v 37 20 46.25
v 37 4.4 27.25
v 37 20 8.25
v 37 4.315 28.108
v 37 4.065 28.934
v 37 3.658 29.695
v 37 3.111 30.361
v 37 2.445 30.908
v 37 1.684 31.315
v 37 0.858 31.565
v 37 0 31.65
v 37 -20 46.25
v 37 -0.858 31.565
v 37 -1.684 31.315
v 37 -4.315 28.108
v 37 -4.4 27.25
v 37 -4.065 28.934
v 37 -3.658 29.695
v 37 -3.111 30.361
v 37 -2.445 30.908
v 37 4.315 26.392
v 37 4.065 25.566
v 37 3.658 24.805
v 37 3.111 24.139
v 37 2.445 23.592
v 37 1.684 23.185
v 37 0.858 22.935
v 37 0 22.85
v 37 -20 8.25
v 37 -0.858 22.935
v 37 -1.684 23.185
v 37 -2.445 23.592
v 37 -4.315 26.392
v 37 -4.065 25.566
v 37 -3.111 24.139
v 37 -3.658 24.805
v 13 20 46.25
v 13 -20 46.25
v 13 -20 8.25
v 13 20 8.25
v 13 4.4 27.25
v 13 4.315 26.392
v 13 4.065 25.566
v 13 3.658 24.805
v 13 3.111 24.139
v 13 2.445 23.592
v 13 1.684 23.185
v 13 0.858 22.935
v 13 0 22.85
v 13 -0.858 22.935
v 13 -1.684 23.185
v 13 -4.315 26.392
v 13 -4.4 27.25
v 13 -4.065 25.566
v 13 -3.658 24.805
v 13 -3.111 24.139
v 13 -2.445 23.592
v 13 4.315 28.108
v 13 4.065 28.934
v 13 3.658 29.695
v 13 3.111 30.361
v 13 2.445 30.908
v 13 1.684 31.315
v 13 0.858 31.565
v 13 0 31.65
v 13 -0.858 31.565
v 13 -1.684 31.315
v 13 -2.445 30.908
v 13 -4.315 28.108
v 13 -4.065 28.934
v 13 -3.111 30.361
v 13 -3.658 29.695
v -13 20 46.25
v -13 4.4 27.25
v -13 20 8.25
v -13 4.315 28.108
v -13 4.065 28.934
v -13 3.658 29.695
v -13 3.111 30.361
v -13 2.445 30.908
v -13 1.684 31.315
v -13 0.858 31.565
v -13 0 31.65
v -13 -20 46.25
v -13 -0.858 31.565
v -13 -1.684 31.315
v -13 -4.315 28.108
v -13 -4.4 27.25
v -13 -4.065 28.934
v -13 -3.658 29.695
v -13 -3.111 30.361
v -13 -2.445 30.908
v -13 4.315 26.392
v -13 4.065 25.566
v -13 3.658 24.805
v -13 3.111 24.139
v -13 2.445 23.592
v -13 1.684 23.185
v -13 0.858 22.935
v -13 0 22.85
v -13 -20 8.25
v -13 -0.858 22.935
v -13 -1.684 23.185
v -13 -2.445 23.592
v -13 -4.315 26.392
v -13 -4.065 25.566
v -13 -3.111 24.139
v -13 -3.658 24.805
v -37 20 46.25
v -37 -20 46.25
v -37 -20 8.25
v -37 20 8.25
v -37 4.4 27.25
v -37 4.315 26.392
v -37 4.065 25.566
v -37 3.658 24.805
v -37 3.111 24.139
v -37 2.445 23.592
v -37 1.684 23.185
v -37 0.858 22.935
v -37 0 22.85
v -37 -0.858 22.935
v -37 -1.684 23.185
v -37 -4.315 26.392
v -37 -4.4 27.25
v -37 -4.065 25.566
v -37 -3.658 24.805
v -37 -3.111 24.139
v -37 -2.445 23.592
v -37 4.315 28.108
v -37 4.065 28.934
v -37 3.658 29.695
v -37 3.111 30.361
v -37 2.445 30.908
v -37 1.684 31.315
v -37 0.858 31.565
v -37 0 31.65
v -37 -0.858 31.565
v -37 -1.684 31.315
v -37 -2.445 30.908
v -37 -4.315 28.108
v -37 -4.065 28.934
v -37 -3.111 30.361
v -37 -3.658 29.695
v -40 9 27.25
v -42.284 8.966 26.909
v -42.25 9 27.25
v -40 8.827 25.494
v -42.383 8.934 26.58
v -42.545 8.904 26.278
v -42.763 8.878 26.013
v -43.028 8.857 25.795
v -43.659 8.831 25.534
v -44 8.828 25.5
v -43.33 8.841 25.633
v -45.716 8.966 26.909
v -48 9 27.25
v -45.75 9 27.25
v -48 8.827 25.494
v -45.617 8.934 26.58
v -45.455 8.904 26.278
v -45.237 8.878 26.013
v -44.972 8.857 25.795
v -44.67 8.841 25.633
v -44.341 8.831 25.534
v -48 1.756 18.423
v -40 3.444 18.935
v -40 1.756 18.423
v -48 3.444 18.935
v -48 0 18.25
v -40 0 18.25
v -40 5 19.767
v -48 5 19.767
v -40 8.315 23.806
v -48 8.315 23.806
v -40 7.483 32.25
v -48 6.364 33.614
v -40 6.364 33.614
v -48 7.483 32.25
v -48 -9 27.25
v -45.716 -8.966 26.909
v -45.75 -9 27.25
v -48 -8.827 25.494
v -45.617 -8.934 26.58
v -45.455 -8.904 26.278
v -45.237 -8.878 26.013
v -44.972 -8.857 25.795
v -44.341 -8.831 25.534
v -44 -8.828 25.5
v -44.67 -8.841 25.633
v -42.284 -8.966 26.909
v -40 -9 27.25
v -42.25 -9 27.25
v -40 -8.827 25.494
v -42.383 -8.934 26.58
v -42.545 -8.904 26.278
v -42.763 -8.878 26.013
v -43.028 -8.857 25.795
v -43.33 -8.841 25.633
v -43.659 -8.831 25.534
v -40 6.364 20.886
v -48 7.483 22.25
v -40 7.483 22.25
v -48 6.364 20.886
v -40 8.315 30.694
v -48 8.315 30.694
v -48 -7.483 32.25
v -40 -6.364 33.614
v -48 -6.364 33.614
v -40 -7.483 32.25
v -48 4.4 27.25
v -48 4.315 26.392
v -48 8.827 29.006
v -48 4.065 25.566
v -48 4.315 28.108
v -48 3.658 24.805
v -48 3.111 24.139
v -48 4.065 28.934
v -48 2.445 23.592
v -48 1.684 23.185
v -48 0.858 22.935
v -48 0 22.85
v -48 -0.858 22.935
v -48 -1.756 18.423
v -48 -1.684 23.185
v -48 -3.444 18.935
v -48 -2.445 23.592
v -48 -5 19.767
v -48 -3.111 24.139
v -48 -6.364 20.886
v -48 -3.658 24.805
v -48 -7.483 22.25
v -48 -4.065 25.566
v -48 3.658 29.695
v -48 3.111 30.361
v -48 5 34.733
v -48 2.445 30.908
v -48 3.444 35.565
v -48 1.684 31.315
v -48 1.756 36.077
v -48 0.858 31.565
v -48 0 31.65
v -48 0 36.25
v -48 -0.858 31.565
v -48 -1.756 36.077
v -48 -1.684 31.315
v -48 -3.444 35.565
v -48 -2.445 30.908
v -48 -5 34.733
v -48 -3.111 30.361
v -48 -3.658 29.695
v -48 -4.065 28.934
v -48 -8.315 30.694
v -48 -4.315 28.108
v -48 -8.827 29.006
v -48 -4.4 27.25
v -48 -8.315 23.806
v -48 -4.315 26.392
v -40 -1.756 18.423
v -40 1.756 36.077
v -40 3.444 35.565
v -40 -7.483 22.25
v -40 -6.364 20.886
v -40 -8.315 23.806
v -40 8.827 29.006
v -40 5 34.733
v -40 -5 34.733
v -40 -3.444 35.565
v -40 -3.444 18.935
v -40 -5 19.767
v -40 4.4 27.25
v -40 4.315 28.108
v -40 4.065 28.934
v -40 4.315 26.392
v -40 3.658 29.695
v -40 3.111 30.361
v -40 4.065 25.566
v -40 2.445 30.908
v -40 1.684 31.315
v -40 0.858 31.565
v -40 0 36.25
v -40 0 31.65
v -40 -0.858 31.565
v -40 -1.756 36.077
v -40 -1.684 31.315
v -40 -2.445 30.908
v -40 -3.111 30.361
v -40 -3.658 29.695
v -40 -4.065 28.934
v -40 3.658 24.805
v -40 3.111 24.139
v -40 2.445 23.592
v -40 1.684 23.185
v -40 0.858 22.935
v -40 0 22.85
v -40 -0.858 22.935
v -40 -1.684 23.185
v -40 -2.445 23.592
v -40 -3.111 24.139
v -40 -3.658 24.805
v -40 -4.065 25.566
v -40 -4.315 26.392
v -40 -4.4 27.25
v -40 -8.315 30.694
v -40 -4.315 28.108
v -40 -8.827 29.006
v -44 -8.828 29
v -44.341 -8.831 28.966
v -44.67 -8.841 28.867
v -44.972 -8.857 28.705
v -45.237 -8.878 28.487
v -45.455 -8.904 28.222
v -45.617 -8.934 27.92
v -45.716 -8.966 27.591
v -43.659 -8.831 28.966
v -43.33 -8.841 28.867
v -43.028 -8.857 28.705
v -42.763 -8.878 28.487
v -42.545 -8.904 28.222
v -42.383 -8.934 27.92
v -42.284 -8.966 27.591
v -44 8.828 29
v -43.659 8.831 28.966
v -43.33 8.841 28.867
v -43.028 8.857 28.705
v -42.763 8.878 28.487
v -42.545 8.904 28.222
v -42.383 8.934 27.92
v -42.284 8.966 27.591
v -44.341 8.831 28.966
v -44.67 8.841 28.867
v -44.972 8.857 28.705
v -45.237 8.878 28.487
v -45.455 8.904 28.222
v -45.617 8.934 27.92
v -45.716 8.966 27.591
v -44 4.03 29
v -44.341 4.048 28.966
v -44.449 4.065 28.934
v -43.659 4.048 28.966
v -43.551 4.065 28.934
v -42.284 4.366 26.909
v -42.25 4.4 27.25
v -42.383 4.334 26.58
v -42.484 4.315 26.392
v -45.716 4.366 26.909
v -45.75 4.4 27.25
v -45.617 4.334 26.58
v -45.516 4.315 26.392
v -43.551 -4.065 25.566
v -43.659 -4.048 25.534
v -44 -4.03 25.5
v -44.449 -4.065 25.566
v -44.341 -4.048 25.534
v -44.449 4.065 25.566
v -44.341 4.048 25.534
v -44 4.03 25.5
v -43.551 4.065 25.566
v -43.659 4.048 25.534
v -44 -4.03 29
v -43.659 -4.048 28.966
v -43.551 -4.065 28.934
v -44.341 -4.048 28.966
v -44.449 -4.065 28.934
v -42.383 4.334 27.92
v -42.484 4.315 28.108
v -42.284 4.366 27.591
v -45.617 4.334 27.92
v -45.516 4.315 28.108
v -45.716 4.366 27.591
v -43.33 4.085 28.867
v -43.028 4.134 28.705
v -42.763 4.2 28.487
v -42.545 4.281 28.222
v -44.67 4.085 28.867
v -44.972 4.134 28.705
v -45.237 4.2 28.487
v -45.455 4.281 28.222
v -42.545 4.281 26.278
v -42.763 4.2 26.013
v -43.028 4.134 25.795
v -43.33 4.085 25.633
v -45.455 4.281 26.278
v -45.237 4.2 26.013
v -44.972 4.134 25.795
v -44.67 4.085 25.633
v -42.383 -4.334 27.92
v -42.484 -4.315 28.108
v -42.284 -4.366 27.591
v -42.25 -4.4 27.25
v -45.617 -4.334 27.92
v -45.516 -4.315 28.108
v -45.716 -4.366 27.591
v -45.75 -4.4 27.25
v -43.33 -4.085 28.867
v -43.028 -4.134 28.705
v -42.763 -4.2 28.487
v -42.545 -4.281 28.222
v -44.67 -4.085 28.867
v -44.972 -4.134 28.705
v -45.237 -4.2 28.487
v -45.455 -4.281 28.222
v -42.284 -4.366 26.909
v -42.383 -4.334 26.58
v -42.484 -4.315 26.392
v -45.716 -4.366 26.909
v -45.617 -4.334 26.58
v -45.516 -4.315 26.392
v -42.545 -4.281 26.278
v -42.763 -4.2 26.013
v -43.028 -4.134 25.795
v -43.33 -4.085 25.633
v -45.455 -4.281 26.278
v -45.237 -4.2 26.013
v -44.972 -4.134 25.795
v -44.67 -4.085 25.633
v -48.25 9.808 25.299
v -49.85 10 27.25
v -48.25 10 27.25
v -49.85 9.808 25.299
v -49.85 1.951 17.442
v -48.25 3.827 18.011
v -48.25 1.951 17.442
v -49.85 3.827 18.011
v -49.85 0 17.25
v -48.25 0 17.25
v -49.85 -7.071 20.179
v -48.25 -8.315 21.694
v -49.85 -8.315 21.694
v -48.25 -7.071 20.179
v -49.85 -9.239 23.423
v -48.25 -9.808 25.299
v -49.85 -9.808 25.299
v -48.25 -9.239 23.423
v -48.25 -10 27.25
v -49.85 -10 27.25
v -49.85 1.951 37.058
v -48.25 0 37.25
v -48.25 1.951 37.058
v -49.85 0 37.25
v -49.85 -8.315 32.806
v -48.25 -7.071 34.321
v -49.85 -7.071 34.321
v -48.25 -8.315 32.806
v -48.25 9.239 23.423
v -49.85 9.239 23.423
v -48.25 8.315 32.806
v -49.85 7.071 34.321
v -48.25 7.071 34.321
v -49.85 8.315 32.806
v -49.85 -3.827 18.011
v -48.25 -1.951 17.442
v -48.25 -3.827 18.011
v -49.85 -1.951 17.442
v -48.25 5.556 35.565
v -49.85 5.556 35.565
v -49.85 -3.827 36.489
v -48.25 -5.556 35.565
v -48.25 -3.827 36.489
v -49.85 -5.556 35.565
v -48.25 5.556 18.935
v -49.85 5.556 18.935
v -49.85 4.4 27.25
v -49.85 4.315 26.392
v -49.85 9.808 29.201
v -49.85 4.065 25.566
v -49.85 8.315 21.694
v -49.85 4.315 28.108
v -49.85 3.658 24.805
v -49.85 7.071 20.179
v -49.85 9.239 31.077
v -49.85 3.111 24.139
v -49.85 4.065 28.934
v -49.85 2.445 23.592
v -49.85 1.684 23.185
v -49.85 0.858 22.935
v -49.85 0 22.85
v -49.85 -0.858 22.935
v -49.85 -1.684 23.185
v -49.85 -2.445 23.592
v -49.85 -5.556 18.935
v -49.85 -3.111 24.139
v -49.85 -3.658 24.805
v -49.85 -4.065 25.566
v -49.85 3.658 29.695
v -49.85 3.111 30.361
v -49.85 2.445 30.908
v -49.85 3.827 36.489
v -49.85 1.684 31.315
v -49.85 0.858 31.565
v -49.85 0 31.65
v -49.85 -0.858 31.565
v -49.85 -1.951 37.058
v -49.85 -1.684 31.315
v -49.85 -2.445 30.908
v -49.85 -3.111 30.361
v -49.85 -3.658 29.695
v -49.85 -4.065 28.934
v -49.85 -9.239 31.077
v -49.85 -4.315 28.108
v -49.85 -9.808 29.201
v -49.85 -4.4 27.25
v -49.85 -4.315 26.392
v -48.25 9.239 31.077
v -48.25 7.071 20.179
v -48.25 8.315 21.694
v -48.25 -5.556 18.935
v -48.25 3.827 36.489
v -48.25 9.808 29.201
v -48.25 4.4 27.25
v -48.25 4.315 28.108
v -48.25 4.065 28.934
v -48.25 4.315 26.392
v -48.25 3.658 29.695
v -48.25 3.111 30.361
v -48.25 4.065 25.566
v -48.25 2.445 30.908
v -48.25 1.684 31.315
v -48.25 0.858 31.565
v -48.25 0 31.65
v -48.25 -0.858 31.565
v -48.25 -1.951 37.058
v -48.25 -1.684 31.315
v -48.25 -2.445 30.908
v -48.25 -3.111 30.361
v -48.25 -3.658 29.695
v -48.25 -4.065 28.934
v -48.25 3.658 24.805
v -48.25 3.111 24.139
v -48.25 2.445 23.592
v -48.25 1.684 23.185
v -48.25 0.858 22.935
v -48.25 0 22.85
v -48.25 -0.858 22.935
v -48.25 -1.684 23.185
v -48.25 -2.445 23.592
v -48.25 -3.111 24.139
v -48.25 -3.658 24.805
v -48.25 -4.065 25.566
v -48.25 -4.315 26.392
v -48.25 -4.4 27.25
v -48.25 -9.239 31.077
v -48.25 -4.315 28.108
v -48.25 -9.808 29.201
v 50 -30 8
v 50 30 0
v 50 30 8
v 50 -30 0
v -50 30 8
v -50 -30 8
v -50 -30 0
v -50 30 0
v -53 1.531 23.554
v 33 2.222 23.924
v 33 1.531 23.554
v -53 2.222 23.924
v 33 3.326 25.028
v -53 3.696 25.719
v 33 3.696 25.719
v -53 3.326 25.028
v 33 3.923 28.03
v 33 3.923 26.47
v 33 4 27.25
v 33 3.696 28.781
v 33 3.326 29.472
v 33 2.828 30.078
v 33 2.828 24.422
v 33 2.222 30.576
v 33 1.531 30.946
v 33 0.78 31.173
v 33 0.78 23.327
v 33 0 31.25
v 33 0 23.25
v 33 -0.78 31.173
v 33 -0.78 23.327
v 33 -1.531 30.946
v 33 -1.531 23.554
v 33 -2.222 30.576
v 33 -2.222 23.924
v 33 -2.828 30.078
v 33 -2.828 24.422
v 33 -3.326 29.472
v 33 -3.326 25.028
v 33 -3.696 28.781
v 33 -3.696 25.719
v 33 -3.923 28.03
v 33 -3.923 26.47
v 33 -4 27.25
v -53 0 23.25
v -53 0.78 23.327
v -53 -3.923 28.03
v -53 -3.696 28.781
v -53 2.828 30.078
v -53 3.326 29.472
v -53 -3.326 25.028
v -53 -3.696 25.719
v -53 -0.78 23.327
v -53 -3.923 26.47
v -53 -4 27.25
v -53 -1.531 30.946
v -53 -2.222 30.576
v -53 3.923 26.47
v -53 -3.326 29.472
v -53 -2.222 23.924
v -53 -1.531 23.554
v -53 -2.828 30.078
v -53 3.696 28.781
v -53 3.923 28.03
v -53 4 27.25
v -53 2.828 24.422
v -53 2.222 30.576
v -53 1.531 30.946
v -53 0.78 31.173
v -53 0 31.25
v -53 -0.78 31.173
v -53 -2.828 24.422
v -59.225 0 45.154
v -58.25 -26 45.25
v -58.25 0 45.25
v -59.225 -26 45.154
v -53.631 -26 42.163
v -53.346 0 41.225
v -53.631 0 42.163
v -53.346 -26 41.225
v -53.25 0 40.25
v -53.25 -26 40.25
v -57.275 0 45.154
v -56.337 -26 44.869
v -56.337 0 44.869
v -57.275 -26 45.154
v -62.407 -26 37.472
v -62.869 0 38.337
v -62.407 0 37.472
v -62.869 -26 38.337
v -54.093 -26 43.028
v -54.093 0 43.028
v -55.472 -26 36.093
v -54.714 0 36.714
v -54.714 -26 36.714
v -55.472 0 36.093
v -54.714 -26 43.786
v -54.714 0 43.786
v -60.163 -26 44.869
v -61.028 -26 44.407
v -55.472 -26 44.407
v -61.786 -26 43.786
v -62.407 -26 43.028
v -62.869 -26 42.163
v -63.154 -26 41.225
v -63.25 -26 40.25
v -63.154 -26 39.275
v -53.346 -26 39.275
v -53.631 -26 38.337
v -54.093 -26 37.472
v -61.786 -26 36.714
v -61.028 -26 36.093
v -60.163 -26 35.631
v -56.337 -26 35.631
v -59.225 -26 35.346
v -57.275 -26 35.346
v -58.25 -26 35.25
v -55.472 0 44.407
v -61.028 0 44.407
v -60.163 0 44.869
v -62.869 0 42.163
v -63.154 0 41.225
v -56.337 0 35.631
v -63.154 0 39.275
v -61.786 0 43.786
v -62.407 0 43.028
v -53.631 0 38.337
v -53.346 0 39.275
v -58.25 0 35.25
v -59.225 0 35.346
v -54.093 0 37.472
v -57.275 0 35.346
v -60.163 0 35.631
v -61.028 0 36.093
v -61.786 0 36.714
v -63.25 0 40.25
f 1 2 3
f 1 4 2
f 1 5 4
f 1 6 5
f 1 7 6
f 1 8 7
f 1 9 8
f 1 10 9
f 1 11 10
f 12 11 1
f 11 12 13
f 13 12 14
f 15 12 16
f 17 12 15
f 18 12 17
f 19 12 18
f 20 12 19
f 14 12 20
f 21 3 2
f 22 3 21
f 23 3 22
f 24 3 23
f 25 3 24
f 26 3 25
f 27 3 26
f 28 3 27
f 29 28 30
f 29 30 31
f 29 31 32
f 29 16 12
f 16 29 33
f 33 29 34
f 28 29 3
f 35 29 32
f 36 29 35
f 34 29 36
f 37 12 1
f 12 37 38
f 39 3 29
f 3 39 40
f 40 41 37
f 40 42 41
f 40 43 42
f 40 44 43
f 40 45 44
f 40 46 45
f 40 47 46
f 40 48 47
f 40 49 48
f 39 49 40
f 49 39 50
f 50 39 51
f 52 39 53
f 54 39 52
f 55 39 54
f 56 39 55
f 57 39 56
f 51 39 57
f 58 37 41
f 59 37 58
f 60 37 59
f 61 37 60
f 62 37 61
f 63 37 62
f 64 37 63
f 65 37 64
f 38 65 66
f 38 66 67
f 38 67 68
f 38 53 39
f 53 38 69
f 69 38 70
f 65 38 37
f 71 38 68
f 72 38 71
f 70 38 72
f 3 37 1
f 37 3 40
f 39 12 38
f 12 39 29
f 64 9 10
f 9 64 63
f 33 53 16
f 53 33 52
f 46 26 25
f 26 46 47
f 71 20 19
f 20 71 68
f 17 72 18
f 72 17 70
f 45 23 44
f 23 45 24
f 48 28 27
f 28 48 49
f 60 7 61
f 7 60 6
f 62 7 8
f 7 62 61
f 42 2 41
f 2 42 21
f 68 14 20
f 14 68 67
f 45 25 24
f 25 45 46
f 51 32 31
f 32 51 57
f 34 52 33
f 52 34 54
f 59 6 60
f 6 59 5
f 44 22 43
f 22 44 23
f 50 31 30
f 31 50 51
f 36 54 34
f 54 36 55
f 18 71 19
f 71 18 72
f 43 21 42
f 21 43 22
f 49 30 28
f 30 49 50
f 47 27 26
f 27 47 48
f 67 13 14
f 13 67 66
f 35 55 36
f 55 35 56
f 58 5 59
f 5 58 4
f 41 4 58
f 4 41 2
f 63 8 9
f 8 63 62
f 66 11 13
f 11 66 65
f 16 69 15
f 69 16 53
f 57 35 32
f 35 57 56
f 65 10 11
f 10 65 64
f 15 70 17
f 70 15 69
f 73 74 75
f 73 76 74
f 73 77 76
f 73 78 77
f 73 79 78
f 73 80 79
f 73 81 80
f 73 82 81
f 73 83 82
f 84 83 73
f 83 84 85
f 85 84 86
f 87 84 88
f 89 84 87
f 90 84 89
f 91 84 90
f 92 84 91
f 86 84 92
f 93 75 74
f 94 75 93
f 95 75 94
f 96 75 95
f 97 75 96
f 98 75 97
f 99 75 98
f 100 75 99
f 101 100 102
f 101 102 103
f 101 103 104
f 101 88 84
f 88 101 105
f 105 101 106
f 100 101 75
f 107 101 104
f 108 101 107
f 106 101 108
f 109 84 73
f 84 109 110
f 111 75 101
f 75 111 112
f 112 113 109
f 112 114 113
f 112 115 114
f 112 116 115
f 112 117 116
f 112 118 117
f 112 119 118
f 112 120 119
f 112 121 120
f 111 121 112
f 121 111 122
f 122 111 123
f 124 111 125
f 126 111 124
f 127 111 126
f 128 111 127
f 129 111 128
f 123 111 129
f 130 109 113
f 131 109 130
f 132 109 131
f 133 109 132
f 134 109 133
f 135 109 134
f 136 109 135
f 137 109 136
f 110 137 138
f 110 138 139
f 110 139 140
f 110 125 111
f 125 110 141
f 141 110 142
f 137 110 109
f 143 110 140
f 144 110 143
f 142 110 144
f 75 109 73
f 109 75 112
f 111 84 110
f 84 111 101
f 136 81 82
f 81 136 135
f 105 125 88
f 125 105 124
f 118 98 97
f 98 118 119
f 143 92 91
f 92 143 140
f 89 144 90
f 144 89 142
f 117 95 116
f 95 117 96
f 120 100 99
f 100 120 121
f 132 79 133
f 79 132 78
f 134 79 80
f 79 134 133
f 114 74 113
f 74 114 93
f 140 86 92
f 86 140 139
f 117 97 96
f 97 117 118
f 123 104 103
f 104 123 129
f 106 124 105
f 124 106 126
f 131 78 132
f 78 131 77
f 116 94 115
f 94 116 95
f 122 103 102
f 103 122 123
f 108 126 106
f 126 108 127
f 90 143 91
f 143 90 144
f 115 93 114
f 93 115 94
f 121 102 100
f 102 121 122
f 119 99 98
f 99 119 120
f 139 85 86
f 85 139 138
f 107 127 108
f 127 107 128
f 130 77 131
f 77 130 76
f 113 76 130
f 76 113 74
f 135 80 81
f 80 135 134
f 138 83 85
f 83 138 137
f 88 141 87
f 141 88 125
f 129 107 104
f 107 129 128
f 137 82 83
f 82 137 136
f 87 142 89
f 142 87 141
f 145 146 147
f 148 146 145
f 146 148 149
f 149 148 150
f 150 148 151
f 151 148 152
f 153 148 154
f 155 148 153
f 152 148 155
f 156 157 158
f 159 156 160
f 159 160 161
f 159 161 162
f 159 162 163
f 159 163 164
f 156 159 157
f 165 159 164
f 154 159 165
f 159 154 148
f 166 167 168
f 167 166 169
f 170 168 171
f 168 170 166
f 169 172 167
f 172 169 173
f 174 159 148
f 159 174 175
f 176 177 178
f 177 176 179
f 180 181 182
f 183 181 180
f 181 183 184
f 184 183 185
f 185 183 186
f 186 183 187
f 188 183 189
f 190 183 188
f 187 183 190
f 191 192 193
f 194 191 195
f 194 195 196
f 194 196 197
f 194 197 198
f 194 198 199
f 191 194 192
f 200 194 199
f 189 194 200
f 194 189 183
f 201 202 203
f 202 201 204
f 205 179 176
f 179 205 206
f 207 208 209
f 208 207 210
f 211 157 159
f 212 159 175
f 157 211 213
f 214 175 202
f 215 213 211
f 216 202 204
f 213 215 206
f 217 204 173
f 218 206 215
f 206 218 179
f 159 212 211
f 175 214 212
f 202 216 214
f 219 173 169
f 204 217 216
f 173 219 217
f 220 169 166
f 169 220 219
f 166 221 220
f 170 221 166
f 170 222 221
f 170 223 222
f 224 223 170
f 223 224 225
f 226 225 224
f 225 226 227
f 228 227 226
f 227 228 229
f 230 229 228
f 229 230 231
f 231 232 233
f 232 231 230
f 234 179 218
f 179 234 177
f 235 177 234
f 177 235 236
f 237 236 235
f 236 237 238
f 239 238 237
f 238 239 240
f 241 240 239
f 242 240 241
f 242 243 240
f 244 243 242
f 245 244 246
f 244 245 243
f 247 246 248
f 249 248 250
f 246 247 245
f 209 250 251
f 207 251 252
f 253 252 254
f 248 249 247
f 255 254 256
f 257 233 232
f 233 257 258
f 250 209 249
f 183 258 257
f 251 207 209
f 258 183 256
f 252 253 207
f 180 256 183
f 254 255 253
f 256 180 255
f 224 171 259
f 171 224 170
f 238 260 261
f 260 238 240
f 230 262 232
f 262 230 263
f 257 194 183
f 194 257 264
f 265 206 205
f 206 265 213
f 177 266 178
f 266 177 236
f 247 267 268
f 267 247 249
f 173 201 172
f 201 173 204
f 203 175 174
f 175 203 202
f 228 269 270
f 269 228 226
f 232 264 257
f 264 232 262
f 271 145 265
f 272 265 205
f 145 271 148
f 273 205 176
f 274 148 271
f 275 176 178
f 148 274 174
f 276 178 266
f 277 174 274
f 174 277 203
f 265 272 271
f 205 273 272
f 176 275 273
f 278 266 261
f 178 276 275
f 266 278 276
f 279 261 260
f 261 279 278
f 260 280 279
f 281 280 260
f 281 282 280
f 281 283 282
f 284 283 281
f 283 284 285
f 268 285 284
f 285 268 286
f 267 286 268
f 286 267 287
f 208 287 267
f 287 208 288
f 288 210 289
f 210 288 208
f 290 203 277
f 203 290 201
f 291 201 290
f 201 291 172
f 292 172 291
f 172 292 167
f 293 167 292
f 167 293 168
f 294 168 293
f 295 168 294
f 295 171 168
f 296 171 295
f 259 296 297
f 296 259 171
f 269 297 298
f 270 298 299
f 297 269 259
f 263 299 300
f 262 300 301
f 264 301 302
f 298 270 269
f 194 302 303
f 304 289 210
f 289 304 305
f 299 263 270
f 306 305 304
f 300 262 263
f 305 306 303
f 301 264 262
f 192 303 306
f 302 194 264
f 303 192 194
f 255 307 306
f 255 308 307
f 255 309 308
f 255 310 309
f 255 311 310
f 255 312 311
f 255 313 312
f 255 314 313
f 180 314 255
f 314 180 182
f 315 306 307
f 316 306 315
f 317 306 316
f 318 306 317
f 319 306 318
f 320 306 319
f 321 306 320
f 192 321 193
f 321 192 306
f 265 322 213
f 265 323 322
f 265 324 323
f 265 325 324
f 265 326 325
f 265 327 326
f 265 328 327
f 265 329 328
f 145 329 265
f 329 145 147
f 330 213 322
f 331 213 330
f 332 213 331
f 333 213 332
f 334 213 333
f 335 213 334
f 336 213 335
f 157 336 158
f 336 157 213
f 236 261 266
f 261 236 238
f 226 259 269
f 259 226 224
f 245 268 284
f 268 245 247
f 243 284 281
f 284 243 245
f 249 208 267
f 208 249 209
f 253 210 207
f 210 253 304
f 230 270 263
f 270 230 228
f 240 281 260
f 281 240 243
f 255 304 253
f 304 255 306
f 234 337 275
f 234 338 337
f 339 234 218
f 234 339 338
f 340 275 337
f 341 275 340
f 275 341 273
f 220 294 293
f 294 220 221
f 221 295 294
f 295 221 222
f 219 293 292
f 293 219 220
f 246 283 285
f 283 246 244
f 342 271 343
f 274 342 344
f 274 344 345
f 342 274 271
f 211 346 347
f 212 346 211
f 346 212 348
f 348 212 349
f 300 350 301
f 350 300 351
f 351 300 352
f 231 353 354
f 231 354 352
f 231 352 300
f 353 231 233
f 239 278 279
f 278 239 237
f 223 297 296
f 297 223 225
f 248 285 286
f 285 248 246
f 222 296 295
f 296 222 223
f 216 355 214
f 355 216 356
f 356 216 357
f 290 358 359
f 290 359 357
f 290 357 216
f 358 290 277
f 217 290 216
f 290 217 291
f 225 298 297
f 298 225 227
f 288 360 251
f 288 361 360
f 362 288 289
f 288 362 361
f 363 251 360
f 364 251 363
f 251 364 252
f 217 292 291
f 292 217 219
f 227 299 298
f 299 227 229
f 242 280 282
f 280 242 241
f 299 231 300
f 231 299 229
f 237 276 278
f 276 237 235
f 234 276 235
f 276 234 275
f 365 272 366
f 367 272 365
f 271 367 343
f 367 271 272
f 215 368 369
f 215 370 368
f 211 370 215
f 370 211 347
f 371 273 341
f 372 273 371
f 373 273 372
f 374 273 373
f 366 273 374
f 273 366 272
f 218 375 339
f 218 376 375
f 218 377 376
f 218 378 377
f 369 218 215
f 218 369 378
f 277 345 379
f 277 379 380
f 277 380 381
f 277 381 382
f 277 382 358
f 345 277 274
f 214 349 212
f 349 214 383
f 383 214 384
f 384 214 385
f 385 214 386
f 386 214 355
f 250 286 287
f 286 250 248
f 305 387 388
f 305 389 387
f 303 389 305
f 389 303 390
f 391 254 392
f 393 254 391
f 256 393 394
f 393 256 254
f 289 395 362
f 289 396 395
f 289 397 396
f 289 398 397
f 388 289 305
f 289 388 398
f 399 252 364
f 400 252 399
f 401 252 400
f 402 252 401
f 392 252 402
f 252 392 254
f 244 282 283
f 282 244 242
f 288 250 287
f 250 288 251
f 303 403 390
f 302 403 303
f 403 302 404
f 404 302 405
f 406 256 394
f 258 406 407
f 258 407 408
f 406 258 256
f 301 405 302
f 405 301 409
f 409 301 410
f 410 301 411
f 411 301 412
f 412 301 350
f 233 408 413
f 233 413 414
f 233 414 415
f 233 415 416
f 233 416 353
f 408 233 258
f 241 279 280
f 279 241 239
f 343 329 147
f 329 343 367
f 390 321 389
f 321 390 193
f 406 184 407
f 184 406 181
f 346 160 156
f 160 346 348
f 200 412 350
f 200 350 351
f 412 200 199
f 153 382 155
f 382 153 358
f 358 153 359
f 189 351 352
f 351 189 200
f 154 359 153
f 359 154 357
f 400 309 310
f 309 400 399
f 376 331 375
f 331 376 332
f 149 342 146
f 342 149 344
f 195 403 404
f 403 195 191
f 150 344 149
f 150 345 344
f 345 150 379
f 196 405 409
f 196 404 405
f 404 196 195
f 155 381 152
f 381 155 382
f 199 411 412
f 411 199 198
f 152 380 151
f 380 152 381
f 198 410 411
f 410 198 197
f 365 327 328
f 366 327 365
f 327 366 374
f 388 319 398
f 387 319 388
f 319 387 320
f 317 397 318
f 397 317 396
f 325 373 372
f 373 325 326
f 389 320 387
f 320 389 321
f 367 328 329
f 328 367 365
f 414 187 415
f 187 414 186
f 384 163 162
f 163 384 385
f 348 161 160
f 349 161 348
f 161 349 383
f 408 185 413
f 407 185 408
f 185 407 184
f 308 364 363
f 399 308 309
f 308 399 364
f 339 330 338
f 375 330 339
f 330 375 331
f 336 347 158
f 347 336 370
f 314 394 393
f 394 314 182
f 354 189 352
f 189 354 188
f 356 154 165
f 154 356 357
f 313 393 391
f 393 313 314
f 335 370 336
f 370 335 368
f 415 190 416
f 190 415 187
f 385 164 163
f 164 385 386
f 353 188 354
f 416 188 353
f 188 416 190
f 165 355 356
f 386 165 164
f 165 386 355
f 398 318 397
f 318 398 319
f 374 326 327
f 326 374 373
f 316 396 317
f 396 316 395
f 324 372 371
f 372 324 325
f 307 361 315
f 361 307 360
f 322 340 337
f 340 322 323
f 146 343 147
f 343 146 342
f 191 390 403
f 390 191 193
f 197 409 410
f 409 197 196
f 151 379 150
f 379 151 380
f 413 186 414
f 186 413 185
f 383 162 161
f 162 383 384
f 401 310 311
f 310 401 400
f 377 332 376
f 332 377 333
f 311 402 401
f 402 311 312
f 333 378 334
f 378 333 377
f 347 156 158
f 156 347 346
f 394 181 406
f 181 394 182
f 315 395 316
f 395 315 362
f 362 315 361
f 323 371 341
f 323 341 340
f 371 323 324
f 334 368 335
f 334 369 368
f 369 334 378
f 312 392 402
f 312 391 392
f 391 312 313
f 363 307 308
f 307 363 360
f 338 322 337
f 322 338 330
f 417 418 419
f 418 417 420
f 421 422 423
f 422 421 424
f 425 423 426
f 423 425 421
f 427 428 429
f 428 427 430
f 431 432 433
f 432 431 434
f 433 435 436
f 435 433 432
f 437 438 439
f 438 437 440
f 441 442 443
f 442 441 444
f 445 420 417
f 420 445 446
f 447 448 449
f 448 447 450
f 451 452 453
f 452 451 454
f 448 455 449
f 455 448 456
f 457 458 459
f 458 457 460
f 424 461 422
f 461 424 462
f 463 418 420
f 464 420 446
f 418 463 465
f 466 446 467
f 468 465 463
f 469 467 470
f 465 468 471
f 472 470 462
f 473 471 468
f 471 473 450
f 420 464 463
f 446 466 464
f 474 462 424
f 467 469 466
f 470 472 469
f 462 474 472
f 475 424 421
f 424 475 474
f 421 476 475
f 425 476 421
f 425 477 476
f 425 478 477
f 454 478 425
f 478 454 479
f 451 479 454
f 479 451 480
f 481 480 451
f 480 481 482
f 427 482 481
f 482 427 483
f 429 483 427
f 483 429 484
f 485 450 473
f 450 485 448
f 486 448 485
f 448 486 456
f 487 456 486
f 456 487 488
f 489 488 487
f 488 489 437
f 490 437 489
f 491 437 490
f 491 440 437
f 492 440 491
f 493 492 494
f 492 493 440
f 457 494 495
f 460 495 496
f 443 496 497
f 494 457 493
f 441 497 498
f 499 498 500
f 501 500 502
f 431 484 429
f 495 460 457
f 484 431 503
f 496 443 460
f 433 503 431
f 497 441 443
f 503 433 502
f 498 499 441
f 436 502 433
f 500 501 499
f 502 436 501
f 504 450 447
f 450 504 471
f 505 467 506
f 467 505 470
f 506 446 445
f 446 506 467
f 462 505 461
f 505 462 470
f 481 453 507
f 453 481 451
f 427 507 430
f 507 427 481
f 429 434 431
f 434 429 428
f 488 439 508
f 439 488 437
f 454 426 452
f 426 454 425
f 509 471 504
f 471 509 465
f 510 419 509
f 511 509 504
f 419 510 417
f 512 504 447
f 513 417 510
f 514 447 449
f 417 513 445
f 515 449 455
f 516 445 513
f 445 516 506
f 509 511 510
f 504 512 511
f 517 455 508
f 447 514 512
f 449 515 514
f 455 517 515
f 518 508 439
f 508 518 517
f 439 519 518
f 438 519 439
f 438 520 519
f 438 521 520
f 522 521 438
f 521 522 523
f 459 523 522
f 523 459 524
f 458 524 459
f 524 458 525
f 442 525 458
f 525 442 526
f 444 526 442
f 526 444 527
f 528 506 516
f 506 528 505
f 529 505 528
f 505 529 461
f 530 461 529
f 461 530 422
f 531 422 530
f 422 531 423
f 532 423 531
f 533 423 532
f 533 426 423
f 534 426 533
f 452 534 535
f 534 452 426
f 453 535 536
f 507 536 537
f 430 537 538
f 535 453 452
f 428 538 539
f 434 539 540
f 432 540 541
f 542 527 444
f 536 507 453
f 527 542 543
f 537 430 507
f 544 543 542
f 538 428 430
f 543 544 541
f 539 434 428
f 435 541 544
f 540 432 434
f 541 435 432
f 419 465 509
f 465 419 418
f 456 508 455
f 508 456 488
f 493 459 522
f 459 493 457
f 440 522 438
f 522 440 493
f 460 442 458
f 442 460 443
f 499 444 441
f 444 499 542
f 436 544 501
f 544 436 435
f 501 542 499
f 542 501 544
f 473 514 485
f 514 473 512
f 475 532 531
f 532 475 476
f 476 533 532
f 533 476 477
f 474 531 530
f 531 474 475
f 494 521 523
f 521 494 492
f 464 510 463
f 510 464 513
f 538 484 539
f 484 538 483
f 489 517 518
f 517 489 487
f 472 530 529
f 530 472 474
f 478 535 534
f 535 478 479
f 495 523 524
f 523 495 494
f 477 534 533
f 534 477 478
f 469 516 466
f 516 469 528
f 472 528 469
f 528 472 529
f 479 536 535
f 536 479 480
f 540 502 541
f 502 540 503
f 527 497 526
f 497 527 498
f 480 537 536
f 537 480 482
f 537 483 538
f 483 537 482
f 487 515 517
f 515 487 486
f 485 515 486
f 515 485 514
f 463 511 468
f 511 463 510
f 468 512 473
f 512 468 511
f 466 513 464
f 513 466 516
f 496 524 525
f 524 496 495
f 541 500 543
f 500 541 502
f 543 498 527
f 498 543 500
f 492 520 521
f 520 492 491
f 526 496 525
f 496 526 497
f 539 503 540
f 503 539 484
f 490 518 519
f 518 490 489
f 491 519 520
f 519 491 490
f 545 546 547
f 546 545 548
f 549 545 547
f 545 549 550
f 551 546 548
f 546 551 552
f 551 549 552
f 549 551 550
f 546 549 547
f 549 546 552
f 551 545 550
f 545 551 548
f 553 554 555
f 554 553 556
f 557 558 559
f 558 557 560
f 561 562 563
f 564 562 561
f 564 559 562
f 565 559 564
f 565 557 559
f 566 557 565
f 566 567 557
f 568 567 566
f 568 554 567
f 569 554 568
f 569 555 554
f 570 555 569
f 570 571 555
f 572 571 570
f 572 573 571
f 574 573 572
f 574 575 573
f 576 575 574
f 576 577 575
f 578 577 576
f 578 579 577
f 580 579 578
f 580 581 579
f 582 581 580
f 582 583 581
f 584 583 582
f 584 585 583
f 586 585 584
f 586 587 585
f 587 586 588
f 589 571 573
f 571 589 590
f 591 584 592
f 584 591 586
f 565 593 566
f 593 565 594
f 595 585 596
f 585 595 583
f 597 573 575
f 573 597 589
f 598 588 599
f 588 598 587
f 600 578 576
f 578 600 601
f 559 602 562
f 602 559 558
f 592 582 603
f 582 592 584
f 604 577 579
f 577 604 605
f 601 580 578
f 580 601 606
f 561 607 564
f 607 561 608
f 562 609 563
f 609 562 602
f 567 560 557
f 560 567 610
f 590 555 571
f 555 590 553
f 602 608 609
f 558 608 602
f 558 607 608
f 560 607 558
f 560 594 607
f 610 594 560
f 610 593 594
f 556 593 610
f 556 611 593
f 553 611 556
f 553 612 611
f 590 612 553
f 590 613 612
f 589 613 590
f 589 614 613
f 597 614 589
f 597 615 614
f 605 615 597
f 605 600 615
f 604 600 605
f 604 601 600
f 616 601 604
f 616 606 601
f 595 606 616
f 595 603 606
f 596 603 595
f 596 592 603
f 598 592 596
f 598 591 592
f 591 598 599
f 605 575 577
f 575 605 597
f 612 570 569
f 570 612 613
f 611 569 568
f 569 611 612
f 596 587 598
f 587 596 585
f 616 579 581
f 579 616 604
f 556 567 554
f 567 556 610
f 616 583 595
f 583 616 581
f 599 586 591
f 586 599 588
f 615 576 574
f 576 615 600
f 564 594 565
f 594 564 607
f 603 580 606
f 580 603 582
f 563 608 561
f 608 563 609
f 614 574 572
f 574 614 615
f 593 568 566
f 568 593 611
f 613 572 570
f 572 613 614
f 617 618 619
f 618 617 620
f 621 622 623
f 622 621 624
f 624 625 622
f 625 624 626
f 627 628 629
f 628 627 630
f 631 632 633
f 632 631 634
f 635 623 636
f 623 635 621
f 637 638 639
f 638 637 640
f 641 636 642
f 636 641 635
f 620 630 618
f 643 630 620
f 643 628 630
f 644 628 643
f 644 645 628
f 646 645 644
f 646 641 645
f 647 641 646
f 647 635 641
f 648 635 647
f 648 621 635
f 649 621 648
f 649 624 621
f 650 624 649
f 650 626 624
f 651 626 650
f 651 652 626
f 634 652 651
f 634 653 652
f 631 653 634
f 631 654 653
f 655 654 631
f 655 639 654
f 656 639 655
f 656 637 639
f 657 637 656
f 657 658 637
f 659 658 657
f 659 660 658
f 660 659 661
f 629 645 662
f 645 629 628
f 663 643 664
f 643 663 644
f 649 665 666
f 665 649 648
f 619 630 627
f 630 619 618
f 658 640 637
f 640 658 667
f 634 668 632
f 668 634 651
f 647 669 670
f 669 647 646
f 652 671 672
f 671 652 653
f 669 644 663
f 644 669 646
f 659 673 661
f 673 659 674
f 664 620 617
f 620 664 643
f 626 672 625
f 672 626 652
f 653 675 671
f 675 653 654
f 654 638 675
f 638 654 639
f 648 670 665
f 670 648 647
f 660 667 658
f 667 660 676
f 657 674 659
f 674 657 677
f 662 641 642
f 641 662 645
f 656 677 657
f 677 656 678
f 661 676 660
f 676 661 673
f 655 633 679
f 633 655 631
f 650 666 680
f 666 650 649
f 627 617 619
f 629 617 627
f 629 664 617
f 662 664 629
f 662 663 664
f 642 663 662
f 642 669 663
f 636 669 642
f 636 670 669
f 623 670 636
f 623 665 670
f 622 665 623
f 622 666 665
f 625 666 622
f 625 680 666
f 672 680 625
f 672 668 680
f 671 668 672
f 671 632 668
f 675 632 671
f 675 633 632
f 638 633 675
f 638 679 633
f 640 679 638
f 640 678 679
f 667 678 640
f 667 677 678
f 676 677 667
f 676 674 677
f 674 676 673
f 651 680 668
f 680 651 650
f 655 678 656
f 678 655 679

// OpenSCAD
$fn = 32;

// ------------------------------------------------------------------------
// Machine vise: screw d8, jaws 24 x 38 mm
// Every part is its own module, assembly() places every instance.
// ------------------------------------------------------------------------

// --- part 1 ---
module vise_bed() {
  difference() {
    translate([-50, -30, 0]) cube([100, 60, 8]);
  }
}

// --- part 2 ---
module vise_jaw() {
  difference() {
    translate([-12, -20, 0]) cube([24, 40, 38]);
    translate([0, 0, 19]) rotate([0, 90, 0]) cylinder(h = 26, d = 8.8, center = true);
  }
}

// --- part 3 ---
module vise_screw() {
  translate([0, 0, -43]) cylinder(h = 86, d = 8);
}

// --- part 4 ---
module screw_collar() {
  difference() {
    cylinder(h = 8, d = 18);
    translate([0, 0, -1]) cylinder(h = 10, d = 8.8);
    translate([0, 0, 4]) rotate([90, 0, 0]) cylinder(h = 20, d = 3.5, center = true);
  }
}

// --- part 5 ---
module screw_washer() {
  difference() {
      translate([0, 0, 0]) cylinder(h = 1.6, d = 20);
      translate([0, 0, -1]) cylinder(h = 3.6, d = 8.8);
    }
}

// --- part 6 ---
module vise_handle() {
  cylinder(h = 26, d = 10);
}

// --- assembly ---
module assembly() {
  color([0.80, 0.24, 0.20]) translate([0, 0, 0]) rotate([0, 0, 0]) vise_bed();
  color([0.20, 0.45, 0.75]) translate([25, 0, 8.25]) rotate([0, 0, 0]) vise_jaw();
  color([0.25, 0.62, 0.32]) translate([-25, 0, 8.25]) rotate([0, 0, 0]) vise_jaw();
  color([0.92, 0.70, 0.18]) translate([-10, 0, 27.25]) rotate([0, 90, 0]) vise_screw();
  color([0.58, 0.35, 0.70]) translate([-48, 0, 27.25]) rotate([0, 90, 0]) screw_collar();
  color([0.16, 0.66, 0.66]) translate([-49.85, 0, 27.25]) rotate([0, 90, 0]) screw_washer();
  color([0.85, 0.48, 0.18]) translate([-58.25, 0, 40.25]) rotate([90, 0, 0]) vise_handle();
}

assembly();
